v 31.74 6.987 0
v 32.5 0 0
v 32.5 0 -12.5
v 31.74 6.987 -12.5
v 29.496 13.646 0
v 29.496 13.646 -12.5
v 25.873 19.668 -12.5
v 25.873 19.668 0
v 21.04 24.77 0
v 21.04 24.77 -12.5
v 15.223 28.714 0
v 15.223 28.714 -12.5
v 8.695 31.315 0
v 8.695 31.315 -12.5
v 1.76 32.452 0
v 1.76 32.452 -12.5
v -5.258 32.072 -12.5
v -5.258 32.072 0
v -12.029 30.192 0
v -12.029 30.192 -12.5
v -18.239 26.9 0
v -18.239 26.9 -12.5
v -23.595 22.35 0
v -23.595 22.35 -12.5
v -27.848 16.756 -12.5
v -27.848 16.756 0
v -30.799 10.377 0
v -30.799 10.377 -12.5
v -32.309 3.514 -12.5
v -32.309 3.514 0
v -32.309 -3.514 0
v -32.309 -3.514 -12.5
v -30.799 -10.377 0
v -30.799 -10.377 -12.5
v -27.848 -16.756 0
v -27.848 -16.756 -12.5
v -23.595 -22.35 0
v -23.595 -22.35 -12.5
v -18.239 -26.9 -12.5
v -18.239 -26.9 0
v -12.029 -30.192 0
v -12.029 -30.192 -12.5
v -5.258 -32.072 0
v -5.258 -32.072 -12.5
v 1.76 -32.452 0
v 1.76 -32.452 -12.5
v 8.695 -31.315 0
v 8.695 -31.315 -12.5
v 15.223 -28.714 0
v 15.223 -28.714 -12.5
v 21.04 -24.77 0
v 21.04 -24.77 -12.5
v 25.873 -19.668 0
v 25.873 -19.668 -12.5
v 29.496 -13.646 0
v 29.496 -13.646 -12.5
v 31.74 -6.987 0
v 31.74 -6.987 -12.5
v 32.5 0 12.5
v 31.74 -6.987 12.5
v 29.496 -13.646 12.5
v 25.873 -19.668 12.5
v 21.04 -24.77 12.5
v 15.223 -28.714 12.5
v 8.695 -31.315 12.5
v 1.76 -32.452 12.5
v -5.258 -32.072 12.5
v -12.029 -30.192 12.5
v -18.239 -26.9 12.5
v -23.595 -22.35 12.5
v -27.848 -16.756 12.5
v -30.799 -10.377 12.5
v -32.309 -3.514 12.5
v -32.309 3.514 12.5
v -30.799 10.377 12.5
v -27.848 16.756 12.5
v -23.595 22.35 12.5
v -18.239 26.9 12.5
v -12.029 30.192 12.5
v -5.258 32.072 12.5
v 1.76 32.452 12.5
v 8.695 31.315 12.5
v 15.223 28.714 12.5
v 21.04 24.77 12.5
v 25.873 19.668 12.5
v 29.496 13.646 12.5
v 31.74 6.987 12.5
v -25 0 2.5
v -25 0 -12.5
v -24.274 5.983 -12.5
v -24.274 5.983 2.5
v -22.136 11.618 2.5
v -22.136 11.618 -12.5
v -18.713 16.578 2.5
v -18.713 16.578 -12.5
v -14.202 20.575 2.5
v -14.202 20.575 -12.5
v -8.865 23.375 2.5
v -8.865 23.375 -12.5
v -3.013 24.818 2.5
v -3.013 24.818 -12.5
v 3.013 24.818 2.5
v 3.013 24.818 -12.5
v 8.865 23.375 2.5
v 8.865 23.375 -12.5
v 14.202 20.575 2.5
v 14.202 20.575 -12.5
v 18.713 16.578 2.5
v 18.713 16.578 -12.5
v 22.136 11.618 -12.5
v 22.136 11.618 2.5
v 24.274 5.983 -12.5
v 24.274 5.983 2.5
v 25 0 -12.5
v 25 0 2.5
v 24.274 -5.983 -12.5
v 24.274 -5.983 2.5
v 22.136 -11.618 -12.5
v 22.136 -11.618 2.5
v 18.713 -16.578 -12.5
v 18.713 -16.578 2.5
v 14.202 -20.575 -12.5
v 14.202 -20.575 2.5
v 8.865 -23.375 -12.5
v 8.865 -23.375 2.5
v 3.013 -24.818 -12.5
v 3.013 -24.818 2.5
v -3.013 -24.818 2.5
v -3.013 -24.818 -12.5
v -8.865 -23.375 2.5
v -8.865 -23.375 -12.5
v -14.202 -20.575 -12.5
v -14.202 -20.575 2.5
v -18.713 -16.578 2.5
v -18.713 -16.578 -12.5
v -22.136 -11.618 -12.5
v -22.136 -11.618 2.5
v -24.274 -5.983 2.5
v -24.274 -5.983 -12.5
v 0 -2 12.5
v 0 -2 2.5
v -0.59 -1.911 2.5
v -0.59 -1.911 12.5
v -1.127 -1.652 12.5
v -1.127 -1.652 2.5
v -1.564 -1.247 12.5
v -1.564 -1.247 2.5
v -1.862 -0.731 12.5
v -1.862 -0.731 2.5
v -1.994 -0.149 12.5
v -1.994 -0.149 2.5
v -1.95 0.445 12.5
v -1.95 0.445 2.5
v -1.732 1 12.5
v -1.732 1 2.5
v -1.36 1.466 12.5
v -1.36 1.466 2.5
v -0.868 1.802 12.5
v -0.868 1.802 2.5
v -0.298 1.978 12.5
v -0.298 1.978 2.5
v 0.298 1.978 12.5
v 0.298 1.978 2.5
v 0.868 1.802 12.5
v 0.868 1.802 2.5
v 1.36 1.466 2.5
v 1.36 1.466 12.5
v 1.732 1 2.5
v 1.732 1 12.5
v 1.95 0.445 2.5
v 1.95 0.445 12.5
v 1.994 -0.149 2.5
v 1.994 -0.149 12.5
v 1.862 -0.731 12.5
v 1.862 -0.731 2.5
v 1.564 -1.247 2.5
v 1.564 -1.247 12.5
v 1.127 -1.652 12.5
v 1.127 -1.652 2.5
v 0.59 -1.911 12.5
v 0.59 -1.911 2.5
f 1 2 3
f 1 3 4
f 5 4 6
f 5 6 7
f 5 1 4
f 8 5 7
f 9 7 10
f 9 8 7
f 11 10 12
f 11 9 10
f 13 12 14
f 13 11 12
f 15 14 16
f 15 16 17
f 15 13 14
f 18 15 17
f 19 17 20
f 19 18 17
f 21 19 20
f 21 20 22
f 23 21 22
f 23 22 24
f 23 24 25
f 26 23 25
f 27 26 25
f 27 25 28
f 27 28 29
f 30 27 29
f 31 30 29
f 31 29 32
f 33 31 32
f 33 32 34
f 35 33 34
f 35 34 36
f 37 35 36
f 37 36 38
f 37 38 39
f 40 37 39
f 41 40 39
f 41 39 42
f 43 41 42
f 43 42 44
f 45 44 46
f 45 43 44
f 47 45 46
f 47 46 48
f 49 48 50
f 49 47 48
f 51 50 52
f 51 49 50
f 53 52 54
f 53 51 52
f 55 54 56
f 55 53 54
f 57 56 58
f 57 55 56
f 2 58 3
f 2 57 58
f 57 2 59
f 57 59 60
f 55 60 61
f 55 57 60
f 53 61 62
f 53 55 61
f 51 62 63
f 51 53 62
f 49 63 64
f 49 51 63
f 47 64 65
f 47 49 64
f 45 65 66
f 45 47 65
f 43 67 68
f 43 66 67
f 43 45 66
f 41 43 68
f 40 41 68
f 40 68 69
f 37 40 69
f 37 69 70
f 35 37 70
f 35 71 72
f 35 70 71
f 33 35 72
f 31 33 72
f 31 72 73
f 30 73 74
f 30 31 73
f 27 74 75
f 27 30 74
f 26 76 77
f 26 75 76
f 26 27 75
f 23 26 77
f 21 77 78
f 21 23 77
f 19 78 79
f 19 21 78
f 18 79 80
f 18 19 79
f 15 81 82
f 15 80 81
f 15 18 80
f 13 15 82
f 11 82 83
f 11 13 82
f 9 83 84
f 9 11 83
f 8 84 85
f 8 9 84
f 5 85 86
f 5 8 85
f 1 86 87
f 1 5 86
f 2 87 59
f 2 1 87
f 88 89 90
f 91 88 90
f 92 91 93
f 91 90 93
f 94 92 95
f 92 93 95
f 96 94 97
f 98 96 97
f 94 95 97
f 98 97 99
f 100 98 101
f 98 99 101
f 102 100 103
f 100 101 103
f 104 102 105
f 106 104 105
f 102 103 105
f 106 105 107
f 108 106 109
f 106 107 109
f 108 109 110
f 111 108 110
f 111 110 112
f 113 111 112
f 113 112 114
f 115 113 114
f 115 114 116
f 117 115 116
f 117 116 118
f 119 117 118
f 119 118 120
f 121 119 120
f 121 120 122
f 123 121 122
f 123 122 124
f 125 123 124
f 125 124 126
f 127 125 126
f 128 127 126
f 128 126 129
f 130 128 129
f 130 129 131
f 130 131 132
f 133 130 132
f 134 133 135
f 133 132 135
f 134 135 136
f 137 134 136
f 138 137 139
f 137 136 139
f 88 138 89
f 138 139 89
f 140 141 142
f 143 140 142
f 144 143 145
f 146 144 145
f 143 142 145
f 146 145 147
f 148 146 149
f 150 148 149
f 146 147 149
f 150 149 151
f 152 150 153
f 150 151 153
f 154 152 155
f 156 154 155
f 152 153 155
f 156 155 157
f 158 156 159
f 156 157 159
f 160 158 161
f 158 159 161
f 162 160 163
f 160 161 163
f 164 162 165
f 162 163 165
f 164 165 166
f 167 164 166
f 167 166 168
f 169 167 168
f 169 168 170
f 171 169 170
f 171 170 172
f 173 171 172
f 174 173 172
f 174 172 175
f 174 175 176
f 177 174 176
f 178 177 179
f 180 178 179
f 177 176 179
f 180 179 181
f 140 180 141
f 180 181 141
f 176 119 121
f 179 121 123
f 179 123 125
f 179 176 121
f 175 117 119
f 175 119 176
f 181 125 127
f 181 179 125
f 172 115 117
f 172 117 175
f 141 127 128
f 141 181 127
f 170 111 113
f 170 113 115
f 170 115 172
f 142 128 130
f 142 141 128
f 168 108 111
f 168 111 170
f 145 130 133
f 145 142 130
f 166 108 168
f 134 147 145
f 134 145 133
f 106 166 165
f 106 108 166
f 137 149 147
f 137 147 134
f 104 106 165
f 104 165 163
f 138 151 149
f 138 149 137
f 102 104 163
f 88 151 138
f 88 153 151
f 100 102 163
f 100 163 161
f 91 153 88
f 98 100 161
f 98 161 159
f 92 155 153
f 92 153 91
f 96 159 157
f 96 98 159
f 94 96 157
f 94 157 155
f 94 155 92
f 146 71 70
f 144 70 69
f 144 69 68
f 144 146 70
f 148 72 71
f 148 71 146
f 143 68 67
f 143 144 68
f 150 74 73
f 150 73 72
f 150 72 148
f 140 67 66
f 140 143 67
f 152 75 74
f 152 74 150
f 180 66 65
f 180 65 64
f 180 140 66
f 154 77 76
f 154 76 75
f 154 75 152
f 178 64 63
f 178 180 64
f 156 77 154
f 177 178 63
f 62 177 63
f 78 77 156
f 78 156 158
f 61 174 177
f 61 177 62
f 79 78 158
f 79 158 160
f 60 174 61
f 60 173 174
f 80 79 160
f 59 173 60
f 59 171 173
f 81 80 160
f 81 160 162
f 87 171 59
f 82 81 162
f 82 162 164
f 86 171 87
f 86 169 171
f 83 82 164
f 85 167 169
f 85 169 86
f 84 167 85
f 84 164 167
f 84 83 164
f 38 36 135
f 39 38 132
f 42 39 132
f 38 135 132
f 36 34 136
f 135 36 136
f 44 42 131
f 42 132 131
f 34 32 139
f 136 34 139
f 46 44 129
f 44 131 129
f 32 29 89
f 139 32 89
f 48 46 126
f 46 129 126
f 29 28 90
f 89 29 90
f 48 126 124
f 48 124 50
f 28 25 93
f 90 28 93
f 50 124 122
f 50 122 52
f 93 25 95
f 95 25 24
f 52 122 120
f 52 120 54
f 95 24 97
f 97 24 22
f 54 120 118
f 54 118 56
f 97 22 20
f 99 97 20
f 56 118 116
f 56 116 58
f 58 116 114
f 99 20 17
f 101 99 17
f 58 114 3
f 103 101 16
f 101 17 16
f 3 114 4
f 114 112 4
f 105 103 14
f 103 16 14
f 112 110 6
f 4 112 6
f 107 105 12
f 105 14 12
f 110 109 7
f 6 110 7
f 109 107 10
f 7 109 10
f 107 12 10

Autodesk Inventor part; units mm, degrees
ref_plane "YZ Plane" through (0, 0, 0) normal (1, 0, 0) x (0, 1, 0)
ref_plane "XZ Plane" through (0, 0, 0) normal (0, 1, 0) x (-1, 0, 0)
ref_plane "XY Plane" through (0, 0, 0) normal (0, 0, 1) x (1, 0, 0)
sketch "Skizze1" plane through (0, 0, 0) normal (0, 0, 1) x (1, 0, 0)
  circle A0 centre (0, 0) radius 32.5
  dimension "d0" = 65
extrude "Extrusion1" add sketch "Skizze1" along normal mid plane 25
sketch "Skizze2" plane through (0, 0, -12.5) normal (0, 0, -1) x (-1, 0, 0)
  circle A0 centre (0, 0) radius 25
  dimension "d3" = 50
extrude "Extrusion2" cut sketch "Skizze2" against normal blind 15
sketch "Skizze3" plane through (0, 0, 12.5) normal (0, 0, 1) x (1, 0, 0)
  point P0 (0, 0)
  point P1 (0, 0)
hole "Bohrung1" at (0, 0, 12.5) direction (0, 0, -1) diameter 4 end through all
properties part number "reifen"
